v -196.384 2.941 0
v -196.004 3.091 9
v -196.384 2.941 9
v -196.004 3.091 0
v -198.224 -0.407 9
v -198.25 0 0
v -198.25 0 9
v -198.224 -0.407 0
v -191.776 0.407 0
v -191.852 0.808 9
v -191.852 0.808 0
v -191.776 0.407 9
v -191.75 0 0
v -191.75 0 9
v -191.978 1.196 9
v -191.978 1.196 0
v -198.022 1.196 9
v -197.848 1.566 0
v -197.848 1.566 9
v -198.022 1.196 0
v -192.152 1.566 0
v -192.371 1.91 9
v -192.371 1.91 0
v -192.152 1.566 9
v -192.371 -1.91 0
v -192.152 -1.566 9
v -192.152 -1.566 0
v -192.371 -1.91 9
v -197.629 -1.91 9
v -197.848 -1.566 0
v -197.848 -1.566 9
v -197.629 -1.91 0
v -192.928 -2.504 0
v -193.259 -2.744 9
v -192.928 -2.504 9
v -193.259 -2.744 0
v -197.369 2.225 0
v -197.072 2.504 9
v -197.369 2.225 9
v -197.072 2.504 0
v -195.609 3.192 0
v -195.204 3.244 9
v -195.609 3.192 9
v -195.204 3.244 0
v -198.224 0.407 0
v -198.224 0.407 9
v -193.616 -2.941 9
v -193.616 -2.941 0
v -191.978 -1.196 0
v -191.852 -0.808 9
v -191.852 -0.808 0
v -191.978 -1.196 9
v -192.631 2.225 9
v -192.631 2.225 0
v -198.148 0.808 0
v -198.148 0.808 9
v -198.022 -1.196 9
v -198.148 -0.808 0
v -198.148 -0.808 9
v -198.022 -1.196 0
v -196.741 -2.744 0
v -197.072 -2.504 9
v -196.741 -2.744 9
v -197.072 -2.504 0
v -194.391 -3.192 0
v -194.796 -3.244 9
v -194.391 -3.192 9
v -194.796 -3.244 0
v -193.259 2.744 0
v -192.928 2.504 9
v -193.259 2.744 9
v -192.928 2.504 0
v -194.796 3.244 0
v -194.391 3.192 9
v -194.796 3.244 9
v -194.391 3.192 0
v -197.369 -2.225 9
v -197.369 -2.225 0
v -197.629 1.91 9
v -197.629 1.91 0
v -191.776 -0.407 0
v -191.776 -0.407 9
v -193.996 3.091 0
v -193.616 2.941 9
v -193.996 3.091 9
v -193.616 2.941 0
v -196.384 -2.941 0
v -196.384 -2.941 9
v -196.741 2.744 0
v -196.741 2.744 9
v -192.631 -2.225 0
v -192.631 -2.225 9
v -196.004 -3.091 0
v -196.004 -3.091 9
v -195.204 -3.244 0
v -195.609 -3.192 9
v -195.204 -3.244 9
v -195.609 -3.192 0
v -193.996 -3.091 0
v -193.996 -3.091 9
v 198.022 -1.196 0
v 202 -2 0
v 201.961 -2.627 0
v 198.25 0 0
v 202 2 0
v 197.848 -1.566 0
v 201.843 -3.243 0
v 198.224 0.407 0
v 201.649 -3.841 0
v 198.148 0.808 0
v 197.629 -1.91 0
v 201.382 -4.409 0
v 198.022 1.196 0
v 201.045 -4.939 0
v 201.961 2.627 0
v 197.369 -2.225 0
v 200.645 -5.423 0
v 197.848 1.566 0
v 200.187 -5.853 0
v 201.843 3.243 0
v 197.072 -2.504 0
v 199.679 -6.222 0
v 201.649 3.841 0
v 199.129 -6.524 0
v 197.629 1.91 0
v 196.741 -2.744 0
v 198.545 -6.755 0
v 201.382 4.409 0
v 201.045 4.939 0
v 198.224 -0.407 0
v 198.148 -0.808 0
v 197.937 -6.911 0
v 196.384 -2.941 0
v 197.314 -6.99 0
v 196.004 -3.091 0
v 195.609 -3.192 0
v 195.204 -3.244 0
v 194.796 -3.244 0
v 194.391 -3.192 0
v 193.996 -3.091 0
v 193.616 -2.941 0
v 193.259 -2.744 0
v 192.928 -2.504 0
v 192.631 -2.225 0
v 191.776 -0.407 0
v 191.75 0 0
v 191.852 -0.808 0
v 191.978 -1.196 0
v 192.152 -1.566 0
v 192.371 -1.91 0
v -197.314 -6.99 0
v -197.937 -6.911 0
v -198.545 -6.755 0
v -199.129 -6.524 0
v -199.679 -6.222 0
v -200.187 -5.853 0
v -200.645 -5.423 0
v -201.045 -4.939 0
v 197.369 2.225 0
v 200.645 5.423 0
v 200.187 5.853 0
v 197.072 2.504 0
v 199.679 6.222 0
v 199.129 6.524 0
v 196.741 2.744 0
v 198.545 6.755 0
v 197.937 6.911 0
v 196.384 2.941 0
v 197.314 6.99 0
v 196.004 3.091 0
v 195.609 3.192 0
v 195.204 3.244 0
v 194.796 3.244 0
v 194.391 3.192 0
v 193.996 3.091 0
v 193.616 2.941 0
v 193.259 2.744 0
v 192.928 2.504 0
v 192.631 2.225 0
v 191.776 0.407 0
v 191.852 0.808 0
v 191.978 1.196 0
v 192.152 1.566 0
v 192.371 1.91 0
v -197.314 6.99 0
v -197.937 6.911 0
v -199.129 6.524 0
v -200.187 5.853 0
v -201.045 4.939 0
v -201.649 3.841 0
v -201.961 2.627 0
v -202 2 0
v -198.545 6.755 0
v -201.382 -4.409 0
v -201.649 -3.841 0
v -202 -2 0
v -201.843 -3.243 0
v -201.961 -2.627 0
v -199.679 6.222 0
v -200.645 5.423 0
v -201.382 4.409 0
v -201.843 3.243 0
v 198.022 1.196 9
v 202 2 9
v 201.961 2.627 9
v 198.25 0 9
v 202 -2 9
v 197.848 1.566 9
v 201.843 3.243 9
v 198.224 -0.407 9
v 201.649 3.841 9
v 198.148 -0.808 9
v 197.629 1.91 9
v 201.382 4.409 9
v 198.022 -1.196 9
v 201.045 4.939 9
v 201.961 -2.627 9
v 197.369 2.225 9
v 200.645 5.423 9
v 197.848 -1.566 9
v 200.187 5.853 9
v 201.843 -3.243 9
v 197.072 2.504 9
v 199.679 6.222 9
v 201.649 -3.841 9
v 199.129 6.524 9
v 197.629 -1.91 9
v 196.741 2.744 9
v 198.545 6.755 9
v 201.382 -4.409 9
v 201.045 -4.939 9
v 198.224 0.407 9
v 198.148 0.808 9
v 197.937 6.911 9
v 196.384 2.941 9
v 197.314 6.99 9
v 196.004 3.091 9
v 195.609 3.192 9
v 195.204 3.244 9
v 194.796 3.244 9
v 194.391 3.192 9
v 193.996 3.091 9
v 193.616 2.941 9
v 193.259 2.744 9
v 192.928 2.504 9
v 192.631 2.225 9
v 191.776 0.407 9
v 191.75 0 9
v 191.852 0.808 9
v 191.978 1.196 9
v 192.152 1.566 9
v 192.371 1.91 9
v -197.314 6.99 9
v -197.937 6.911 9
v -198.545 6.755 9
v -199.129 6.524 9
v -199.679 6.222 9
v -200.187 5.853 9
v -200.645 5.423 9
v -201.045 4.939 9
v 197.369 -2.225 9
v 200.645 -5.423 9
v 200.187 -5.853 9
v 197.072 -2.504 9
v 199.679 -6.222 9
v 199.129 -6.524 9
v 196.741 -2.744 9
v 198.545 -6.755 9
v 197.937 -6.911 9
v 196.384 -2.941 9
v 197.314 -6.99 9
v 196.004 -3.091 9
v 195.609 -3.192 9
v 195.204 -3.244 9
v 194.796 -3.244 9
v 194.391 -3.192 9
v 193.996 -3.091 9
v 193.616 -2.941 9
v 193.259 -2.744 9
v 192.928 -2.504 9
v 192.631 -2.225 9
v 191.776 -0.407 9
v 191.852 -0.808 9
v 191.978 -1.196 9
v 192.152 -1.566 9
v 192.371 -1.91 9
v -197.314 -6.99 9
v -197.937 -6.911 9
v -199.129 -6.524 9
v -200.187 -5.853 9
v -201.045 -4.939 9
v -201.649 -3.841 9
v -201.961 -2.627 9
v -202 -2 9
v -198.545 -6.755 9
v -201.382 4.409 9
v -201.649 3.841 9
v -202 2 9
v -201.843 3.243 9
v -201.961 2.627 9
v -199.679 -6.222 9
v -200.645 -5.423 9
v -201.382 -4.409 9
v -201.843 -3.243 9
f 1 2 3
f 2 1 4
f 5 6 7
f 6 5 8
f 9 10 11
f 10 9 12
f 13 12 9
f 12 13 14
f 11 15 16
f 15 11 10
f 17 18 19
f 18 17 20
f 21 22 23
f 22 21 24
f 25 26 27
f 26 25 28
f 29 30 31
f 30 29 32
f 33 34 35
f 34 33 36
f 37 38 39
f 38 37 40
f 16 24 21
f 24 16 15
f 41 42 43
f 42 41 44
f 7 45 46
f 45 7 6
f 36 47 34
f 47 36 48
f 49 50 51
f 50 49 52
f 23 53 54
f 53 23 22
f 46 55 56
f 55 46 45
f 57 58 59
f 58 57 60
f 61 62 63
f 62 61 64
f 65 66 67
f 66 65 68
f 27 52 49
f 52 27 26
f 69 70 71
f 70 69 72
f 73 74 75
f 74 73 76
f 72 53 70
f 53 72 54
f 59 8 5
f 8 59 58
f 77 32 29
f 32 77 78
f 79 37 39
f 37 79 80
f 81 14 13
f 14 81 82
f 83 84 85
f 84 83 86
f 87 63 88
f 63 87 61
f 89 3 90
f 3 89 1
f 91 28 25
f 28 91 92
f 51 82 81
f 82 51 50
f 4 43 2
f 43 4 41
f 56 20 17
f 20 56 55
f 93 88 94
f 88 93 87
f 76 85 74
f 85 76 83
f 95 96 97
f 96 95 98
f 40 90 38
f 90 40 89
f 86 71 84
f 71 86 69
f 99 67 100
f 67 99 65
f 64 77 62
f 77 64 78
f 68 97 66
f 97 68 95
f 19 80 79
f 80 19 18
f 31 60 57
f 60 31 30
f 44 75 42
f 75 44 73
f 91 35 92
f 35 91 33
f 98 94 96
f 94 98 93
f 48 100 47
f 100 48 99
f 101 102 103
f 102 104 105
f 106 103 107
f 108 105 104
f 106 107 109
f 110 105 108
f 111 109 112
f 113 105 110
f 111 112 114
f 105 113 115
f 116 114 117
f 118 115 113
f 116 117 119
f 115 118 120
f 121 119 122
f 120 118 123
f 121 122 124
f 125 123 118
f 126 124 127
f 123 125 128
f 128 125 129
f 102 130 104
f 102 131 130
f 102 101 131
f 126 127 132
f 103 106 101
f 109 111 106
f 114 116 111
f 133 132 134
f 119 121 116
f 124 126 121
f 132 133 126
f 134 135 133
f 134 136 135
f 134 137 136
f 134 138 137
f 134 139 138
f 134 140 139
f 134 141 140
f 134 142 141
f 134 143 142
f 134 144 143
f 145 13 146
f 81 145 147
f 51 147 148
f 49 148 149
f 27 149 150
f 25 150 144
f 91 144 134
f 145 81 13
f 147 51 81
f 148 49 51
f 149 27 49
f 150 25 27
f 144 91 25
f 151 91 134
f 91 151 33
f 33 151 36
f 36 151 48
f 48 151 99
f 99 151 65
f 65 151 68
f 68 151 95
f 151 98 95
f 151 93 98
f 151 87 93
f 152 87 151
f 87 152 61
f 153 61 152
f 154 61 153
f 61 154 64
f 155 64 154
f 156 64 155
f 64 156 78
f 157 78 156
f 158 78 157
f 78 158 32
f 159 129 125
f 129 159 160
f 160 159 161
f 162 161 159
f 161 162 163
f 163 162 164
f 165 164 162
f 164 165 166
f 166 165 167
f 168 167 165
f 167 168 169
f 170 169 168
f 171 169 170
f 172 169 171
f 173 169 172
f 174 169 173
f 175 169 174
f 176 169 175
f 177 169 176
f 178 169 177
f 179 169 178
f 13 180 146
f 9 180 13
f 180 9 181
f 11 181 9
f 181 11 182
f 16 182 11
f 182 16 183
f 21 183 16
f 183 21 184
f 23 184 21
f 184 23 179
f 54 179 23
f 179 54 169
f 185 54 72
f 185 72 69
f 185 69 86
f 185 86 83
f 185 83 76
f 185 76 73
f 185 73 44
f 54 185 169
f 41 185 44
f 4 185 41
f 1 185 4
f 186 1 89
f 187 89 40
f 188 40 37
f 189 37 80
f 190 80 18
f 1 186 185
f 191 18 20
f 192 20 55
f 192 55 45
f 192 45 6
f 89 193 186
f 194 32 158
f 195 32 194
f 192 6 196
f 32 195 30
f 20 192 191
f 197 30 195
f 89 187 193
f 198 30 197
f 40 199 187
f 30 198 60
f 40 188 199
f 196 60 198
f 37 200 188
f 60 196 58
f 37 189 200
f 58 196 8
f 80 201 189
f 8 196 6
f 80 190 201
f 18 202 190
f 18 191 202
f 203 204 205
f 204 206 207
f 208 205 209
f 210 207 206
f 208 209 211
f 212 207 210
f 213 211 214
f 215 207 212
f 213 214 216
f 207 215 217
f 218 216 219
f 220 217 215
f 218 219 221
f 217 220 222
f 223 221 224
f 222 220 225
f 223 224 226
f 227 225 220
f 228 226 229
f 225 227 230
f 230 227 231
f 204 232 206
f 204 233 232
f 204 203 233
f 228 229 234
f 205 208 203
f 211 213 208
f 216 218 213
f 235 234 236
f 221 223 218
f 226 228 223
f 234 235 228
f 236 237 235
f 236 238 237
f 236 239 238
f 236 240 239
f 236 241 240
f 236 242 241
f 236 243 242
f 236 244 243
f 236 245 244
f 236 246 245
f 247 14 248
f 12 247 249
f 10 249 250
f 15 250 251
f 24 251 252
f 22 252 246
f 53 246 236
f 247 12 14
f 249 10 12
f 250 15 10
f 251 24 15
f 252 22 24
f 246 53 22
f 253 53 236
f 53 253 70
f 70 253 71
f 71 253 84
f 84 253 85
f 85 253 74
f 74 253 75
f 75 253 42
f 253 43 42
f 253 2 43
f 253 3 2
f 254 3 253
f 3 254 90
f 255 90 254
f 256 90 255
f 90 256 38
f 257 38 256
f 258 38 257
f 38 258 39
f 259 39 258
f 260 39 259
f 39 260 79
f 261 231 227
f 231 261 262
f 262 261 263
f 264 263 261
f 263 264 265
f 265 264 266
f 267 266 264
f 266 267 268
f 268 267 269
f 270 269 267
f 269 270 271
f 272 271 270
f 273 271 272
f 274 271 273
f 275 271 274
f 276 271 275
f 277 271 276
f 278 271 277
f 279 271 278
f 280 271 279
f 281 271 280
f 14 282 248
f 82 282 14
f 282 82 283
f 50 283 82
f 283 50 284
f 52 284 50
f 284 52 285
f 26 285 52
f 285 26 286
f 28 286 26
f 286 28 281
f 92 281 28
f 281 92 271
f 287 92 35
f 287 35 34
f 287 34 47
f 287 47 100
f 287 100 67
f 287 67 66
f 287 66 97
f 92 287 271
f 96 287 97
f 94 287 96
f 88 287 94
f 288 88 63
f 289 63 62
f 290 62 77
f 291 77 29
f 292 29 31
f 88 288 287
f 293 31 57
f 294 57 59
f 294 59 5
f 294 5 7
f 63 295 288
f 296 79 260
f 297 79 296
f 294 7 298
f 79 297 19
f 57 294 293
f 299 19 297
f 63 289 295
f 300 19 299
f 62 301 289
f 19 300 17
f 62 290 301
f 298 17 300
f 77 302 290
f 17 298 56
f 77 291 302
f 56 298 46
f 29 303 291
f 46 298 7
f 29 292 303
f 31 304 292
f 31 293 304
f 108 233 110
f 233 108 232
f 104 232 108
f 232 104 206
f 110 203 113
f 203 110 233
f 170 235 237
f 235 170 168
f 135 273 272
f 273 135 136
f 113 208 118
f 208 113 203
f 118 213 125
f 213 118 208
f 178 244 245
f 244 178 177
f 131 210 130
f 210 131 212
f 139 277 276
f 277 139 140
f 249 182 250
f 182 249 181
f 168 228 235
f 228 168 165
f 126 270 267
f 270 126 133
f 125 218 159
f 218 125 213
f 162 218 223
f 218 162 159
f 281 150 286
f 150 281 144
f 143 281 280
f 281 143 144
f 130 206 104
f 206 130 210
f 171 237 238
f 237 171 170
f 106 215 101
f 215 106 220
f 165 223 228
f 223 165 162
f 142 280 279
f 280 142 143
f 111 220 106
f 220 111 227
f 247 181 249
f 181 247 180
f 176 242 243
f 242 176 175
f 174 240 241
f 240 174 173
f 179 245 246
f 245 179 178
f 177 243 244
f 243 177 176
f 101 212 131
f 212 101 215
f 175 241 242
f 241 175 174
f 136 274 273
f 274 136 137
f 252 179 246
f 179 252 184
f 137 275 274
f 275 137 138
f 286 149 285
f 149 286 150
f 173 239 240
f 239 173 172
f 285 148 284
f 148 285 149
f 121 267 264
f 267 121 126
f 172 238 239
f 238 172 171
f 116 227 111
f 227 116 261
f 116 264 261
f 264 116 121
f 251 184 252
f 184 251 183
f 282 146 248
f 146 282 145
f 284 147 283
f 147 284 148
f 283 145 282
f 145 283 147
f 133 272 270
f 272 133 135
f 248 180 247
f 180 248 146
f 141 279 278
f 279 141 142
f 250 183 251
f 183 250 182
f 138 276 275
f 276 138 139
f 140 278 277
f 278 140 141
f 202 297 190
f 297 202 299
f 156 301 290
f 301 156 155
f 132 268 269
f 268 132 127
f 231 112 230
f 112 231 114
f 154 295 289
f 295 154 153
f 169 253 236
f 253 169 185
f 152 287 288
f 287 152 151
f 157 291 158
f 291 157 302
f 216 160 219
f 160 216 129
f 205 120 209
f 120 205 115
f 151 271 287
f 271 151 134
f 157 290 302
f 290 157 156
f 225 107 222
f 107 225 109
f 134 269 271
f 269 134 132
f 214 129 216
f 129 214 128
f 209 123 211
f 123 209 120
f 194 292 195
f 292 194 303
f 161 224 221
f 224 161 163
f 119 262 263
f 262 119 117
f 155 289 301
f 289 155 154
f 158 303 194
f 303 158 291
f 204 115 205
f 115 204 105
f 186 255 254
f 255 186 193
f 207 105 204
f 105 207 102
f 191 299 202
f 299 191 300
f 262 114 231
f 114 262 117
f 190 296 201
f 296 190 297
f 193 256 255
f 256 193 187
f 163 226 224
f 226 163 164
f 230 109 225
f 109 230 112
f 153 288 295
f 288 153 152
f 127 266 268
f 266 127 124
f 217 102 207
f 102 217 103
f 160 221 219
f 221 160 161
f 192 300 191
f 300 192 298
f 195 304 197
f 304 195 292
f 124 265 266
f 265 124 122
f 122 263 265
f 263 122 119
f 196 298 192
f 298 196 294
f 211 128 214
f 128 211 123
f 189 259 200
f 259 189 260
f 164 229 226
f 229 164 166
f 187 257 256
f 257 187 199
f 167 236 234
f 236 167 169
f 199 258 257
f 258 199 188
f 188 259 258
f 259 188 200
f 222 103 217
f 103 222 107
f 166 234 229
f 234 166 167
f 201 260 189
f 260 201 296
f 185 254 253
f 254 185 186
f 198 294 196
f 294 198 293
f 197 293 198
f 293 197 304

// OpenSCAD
$fn = 50;


difference() {
	union() {
		hull() {
			translate(v = [-197.0000000000, 2.0000000000, 0]) {
				cylinder(h = 9, r = 5);
			}
			translate(v = [197.0000000000, 2.0000000000, 0]) {
				cylinder(h = 9, r = 5);
			}
			translate(v = [-197.0000000000, -2.0000000000, 0]) {
				cylinder(h = 9, r = 5);
			}
			translate(v = [197.0000000000, -2.0000000000, 0]) {
				cylinder(h = 9, r = 5);
			}
		}
	}
	union() {
		translate(v = [-195.0000000000, 0.0000000000, 0]) {
			cylinder(h = 9, r = 3.2500000000);
		}
		translate(v = [195.0000000000, 0.0000000000, 0]) {
			cylinder(h = 9, r = 3.2500000000);
		}
		translate(v = [-195.0000000000, 0.0000000000, 0]) {
			cylinder(h = 9, r = 1.8000000000);
		}
		translate(v = [195.0000000000, 0.0000000000, 0]) {
			cylinder(h = 9, r = 1.8000000000);
		}
		translate(v = [-195.0000000000, 0.0000000000, 0]) {
			cylinder(h = 9, r = 1.8000000000);
		}
		translate(v = [195.0000000000, 0.0000000000, 0]) {
			cylinder(h = 9, r = 1.8000000000);
		}
		translate(v = [-195.0000000000, 0.0000000000, 0]) {
			cylinder(h = 9, r = 1.8000000000);
		}
		translate(v = [195.0000000000, 0.0000000000, 0]) {
			cylinder(h = 9, r = 1.8000000000);
		}
	}
}
